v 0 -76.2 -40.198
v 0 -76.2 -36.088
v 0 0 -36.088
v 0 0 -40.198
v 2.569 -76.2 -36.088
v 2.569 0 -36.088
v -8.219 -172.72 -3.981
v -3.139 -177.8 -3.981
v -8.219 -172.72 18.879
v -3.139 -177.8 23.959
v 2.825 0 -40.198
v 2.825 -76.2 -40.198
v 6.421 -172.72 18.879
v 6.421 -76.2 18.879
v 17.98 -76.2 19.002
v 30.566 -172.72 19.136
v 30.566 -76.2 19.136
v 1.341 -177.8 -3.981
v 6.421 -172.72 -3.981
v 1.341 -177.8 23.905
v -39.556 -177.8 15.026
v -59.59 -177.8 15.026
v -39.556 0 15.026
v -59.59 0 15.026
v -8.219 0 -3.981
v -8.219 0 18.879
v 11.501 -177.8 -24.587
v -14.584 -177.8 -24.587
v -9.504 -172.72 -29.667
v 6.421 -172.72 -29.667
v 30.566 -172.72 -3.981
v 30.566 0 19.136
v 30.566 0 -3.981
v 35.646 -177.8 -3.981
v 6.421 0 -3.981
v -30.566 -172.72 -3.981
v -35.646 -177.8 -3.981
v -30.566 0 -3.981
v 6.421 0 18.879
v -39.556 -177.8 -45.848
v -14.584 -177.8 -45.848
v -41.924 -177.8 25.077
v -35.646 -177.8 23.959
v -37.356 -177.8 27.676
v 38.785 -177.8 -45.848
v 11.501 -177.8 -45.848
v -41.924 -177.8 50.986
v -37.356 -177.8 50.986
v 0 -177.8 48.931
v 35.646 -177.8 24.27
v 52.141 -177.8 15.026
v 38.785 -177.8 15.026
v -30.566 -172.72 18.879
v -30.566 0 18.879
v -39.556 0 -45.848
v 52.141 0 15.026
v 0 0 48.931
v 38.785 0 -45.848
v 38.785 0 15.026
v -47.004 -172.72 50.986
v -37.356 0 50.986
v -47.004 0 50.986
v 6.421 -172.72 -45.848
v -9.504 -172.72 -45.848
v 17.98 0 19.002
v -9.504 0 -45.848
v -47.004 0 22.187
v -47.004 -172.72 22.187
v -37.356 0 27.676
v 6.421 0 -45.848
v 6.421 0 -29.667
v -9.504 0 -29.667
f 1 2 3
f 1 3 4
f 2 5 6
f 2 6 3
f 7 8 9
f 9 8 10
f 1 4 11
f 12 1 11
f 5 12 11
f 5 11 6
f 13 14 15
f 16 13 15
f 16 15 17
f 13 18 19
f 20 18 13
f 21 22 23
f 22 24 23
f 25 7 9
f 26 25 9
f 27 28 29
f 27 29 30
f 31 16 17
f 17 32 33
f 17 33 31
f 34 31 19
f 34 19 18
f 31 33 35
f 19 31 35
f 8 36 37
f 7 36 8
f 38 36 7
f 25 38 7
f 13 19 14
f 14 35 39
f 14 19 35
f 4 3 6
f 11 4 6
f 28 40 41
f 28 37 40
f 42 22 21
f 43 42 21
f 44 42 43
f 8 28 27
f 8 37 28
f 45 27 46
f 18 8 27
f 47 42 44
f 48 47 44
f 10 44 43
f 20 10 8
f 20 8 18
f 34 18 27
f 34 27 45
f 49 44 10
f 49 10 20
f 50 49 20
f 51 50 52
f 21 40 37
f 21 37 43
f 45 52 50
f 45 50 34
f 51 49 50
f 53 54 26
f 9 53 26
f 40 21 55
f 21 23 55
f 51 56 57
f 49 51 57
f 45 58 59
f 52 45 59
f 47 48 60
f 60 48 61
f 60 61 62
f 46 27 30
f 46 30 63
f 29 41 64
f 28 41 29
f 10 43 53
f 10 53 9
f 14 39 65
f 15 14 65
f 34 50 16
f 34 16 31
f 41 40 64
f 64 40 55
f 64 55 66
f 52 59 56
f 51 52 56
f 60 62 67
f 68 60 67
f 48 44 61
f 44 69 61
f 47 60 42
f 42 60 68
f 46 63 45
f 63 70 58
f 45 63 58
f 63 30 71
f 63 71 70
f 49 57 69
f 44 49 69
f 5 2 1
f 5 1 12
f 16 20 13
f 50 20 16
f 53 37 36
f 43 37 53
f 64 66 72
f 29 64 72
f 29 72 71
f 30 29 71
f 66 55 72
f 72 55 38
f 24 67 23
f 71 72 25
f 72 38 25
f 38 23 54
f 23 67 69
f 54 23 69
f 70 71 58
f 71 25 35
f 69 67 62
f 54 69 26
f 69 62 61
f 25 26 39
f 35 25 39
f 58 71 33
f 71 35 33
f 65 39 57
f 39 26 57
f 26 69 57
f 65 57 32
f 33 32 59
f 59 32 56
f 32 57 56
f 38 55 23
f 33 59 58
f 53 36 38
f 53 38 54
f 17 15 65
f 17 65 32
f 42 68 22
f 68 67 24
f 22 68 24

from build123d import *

# Parameters (mm, degrees)
F1_DEPTH = 76.2
F2_W     = 22.3462916911
F2_H     = 22.860001307
F3_DEPTH = 101.6
F4_SIZE  = 5.08
F5_SIZE  = 5.08


with BuildPart() as f1:
    # F0 (on Front) → F1 (new body)
    with BuildSketch(Plane.XZ):
        Polygon((-47.0042712986, 22.1868652862), (-37.3558938123, 27.6764601325), (-37.3558938123, 50.9855039418), (-47.0042712986, 50.9855039418), align=None)
        Polygon((52.1413497627, 15.0259546936), (0, 48.9306785166), (-37.3558938123, 27.6764601325), (-47.0042712986, 22.1868652862), (-59.5901124179, 15.0259546936), (-39.5555049181, 15.0259546936), (-39.5555049181, -45.8484254777), (-9.503595531, -45.8484254777), (-9.503595531, -29.6666305512), (6.4213485457, -29.6666305512), (6.4213485457, -45.8484254777), (38.784943521, -45.8484254777), (38.784943521, 15.0259546936), align=None)
        Polygon((-30.565617606, 7.4487647507), (-30.565617606, 18.8787654042), (-19.3924717605, 18.8787654042), (-8.219325915, 18.8787654042), (-8.219325915, 7.4487647507), (-8.219325915, -3.9812359028), (-19.3924717605, -3.9812359028), (-30.565617606, -3.9812359028), align=None, mode=Mode.SUBTRACT)
        Polygon((6.4213485457, 7.4487647507), (6.4213485457, 18.8787654042), (17.9797746241, 19.0017270067), (30.5656213313, 19.1356185824), (30.5656213313, 7.5771913398), (30.5656213313, -3.9812359028), (17.9797746241, -3.9812359028), (6.4213485457, -3.9812359028), align=None, mode=Mode.SUBTRACT)
    extrude(amount=F1_DEPTH)

    # F2 (on face) → F3 (join)
    with BuildSketch(Plane.XZ.offset(76.2)):
        Polygon((0, 48.9306785166), (-37.3558938123, 27.6764601325), (-37.3558938123, 50.9855039418), (-47.0042712986, 50.9855039418), (-47.0042712986, 22.1868652862), (-59.5901124179, 15.0259546936), (-39.5555049181, 15.0259546936), (-39.5555049181, -45.8484254777), (-9.503595531, -45.8484254777), (-9.503595531, -29.6666305512), (6.4213485457, -29.6666305512), (6.4213485457, -45.8484254777), (38.784943521, -45.8484254777), (38.784943521, 15.0259546936), (52.1413497627, 15.0259546936), align=None)
        with Locations((-19.3924717605, 7.4487647507)):
            Rectangle(F2_W, F2_H, mode=Mode.SUBTRACT)
        Polygon((30.5656213313, -3.9812359028), (6.4213485457, -3.9812359028), (6.4213485457, 18.8787654042), (30.5656213313, 19.1356185824), align=None, mode=Mode.SUBTRACT)
    extrude(amount=F3_DEPTH)

    # F4
    f4_edges = [f1.edges().sort_by_distance(p)[0] for p in [
        (-30.565618, -177.8, 7.448765),
        (-19.392472, -177.8, 18.878765),
        (-8.219326, -177.8, 7.448765),
        (6.421349, -177.8, 7.448765),
        (18.493485, -177.8, 19.007192),
        (30.565621, -177.8, 7.577191),
        (-1.541123, -177.8, -29.666631),
        (-9.503596, -177.8, -37.757528),
        (6.421349, -177.8, -37.757528),
    ]]
    chamfer(f4_edges, length=F4_SIZE)

    # F5
    f5_edges = [f1.edges().sort_by_distance(p)[0] for p in [
        (-47.004271, -177.8, 36.586185),
    ]]
    chamfer(f5_edges, length=F5_SIZE)


with BuildPart() as f1b:
    # F0 (on Front) → F1, piece 2 (new body)
    with BuildSketch(Plane.XZ):
        Polygon((2.8253942728, -40.1976443827), (2.5685403962, -36.0879786313), (0, -36.0879786313), (0, -40.1976443827), align=None)
    extrude(amount=F1_DEPTH)


solid = Compound([f1.part, f1b.part])
